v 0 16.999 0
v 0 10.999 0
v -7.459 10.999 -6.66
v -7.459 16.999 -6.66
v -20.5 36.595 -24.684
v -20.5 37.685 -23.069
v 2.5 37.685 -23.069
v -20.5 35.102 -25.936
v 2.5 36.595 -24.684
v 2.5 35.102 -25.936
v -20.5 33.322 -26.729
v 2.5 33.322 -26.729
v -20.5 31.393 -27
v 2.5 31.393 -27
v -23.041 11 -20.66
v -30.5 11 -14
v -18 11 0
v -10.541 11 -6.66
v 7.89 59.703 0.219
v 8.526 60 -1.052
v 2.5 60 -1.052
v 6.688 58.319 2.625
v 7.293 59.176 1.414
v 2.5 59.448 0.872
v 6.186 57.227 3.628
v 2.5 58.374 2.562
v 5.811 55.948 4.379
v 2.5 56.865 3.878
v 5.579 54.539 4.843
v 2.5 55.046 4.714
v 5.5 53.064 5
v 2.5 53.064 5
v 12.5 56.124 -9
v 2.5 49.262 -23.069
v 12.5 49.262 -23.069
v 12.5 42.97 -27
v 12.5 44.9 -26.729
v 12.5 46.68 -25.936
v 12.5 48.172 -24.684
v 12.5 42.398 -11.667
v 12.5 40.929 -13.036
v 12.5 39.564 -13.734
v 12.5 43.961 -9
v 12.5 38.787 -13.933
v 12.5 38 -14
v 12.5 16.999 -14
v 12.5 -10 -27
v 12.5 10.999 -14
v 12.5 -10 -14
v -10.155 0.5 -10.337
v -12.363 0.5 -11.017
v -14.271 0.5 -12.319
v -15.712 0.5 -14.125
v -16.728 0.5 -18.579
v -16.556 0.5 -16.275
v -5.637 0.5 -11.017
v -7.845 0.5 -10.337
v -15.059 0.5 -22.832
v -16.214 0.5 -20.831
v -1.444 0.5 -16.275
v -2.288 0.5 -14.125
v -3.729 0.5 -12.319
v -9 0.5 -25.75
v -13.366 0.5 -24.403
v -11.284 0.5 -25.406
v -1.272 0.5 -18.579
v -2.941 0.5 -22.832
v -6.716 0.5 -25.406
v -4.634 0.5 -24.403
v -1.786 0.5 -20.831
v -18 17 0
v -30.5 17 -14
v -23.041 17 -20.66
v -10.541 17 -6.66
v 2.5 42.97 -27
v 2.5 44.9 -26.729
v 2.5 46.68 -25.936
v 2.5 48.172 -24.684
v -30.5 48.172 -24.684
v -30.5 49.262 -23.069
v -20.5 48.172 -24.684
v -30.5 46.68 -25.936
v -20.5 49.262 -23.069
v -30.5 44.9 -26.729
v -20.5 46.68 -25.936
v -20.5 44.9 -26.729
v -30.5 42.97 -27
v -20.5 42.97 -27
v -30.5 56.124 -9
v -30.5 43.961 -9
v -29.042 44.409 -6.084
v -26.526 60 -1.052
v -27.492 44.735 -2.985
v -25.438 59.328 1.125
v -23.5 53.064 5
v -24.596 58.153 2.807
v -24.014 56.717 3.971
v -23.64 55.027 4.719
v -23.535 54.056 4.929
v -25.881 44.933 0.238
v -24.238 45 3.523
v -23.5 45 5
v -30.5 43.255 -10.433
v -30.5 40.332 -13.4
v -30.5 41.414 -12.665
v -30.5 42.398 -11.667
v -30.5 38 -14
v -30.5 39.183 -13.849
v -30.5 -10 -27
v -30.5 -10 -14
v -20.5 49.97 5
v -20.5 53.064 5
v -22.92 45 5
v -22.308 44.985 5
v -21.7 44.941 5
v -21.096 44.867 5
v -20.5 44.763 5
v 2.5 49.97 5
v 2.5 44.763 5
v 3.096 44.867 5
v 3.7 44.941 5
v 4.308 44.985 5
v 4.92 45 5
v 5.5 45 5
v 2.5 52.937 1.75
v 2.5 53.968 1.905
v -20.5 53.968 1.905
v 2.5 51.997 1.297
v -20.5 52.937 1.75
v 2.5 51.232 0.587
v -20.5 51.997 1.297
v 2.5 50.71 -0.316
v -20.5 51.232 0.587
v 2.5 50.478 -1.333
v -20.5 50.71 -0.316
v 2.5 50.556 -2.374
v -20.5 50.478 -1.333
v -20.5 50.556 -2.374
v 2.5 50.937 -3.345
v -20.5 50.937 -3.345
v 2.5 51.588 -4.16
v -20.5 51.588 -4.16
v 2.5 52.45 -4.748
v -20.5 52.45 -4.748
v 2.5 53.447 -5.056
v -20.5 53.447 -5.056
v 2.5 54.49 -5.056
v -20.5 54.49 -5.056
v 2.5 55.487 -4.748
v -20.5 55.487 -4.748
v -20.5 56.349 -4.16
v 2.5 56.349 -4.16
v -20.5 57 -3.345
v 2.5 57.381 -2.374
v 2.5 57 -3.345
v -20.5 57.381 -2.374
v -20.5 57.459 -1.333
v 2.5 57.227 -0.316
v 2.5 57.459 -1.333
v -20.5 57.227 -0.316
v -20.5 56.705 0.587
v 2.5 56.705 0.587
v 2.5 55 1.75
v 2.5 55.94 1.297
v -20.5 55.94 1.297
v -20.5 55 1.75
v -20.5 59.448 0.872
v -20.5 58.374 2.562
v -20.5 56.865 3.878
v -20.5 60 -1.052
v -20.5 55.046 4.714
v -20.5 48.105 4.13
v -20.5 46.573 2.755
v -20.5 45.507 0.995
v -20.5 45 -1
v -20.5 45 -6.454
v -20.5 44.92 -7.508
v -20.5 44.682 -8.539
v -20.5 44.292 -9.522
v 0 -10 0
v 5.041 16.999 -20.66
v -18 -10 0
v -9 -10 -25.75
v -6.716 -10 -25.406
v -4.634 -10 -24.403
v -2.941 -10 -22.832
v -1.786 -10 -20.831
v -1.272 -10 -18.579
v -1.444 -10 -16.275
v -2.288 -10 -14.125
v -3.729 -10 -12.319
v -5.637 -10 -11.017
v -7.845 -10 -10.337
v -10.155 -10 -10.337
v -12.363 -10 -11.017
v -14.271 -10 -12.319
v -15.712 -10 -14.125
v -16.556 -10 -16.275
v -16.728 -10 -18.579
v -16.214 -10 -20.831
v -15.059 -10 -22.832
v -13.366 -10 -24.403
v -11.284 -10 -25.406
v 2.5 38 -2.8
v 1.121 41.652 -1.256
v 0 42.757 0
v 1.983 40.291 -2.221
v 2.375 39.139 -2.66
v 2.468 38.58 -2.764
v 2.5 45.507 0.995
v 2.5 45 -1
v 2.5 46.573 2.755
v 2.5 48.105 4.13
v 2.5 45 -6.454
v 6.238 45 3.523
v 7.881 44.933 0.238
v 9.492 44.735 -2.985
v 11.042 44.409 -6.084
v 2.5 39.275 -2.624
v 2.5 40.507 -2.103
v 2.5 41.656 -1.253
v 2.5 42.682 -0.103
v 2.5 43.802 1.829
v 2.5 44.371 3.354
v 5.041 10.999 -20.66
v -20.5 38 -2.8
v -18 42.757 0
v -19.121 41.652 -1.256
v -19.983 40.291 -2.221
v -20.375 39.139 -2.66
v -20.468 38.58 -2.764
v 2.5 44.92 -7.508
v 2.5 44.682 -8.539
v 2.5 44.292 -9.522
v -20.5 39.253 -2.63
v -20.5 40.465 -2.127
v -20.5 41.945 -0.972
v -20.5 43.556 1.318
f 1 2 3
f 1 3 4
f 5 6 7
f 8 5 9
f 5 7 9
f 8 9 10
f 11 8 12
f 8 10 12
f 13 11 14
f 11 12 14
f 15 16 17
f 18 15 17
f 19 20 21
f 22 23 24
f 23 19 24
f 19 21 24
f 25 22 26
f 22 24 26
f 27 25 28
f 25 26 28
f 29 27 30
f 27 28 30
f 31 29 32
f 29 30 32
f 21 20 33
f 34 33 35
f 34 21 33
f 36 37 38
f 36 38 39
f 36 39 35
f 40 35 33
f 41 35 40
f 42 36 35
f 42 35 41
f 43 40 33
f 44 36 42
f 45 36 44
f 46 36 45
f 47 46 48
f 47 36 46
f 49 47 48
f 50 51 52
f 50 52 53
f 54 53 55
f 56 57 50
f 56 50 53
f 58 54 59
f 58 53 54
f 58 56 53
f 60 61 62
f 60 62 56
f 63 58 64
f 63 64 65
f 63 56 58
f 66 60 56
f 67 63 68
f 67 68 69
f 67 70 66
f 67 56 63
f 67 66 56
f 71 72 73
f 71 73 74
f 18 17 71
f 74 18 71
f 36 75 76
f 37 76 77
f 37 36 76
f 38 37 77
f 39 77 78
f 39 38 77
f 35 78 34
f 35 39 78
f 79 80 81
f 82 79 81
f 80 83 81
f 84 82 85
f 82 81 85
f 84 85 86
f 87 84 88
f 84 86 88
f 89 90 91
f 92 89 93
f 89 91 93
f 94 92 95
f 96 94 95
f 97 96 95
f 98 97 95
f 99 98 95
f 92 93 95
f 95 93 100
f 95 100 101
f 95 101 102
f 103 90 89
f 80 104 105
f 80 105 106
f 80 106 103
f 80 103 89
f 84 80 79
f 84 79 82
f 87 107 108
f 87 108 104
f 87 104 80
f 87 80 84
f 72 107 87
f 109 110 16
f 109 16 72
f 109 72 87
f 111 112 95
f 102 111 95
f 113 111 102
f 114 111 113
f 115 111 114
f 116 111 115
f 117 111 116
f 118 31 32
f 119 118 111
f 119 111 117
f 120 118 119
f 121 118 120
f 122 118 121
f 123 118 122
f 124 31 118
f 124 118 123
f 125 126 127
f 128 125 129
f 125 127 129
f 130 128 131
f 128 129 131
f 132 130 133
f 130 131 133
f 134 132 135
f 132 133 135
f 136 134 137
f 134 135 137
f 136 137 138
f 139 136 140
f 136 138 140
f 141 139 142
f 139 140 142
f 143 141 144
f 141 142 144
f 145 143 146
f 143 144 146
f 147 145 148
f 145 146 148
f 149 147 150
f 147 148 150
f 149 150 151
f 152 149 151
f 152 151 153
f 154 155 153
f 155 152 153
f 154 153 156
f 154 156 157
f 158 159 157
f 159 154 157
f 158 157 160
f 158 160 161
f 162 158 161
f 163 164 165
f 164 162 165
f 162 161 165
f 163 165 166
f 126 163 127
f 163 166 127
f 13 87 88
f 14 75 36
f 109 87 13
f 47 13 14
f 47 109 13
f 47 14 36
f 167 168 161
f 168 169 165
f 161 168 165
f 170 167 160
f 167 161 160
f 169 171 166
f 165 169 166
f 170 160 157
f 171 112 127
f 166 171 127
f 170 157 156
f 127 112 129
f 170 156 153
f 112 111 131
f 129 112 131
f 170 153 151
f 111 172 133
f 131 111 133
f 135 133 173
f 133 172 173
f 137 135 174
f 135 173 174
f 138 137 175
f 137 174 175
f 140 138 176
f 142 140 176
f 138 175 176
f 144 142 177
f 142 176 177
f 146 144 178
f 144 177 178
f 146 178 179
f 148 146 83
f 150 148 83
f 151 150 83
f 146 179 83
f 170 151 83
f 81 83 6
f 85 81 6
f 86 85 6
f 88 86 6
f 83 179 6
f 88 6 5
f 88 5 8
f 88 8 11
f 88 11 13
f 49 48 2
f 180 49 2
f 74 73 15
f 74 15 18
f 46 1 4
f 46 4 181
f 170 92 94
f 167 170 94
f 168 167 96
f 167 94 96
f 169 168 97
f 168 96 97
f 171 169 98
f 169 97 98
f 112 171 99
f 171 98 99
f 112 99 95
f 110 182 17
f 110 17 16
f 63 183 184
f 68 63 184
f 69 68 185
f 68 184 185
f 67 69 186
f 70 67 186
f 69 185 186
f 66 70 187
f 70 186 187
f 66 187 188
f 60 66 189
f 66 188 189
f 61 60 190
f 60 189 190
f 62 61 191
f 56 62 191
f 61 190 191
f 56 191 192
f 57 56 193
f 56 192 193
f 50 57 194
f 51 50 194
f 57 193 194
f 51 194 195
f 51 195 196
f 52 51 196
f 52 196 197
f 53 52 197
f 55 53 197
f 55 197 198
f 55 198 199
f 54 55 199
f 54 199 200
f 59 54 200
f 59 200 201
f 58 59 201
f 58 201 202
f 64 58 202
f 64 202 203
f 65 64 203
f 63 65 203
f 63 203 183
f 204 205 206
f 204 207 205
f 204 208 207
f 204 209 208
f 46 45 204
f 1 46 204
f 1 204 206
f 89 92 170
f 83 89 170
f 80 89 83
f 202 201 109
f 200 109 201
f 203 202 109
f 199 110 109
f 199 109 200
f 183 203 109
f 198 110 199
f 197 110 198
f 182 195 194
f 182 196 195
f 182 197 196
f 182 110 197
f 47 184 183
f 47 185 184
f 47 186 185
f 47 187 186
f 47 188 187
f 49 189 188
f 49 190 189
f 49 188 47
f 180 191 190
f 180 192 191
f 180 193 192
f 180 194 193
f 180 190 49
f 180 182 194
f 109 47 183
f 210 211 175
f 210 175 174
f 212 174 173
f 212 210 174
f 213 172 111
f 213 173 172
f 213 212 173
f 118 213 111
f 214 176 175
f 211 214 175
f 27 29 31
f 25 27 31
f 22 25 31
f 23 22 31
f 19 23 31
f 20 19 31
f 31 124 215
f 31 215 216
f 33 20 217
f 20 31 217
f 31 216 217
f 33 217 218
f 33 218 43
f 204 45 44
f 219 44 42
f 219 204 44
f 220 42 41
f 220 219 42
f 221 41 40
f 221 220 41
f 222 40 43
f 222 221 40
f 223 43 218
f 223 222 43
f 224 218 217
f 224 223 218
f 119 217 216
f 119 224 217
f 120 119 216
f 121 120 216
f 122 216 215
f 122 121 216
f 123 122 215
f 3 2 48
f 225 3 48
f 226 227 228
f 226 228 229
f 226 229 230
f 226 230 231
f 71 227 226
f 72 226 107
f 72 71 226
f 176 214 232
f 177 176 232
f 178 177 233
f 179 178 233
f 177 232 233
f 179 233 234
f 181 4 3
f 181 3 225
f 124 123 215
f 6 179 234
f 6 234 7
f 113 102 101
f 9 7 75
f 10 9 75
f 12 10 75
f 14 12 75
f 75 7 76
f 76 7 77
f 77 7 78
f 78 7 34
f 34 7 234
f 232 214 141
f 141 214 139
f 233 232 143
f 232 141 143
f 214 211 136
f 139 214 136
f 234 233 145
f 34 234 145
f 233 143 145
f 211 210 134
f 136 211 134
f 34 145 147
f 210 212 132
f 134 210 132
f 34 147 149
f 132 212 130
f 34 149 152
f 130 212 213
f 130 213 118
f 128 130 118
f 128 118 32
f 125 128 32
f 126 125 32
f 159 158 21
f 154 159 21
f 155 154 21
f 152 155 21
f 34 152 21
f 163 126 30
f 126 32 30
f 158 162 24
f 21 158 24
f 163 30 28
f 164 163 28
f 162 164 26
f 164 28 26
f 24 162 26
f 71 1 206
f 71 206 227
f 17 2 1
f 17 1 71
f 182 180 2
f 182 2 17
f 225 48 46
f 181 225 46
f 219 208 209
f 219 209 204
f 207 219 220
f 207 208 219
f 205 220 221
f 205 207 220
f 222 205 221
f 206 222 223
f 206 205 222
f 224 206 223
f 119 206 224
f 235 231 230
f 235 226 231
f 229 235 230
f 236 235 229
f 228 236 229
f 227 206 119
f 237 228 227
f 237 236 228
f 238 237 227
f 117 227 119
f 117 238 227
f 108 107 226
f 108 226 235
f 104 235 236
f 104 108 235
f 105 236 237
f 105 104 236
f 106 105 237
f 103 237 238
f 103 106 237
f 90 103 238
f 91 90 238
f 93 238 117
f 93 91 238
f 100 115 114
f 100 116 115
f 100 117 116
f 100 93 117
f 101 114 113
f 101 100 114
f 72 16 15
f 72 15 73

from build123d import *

# Parameters (mm, degrees)
BOSS_EXTRUDE1_DEPTH     = 30
SKETCH6_R               = 7.75
CUT_EXTRUDE3_DEPTH      = 0.5
BOSS_EXTRUDE2_DEPTH     = 15
BOSS_EXTRUDE3_DEPTH     = 15
CHAMFER1_SIZE           = 5
CHAMFER1_SIZE2          = 10.251519208
BOSS_EXTRUDE5_DEPTH     = 15
BOSS_EXTRUDE6_REACH     = 75.607
SKETCH10_R              = 3.5
BOSS_EXTRUDE7_REACH     = 62.698
SKETCH18_W              = 10
SKETCH18_H              = 10.251519208
CUT_EXTRUDE4_DEPTH      = 74.607064878
CUT_EXTRUDE4_DEPTH_BACK = 74.607064878
FILLET4_R               = 7
FILLET5_R               = 7
FILLET6_R               = 7
FILLET7_R               = 7
BOSS_EXTRUDE8_REACH     = 75.607
FILLET9_R               = 7
CUT_EXTRUDE5_DEPTH      = 23
FILLET12_R              = 7
BOSS_EXTRUDE9_REACH     = 75.607
BOSS_EXTRUDE10_START    = 10
SKETCH24_R              = 7.75
BOSS_EXTRUDE10_DEPTH    = 10
SKETCH25_W              = 18.768324379
SKETCH25_H              = 6
CUT_EXTRUDE6_DEPTH      = 10
SKETCH26_W              = 18.768324379
SKETCH26_H              = 6
CUT_EXTRUDE7_DEPTH      = 10


with BuildPart() as part:
    # Sketch1 → Boss-Extrude1 (new body)
    with BuildSketch(Plane(origin=(0, 0, 0), x_dir=(1, 0, 0), z_dir=(0, 1, 0))):
        Polygon((-30.5, 27), (12.5, 27), (12.5, 14), (0, 0), (-18, 0), (-30.5, 14), align=None)
    extrude(amount=BOSS_EXTRUDE1_DEPTH)

    # Sketch6 → Cut-Extrude3 (cut)
    with BuildSketch(Plane.XZ):
        with Locations(Location((-9, -18, 0), (0, 0, 270))):
            Circle(SKETCH6_R)
    extrude(amount=-CUT_EXTRUDE3_DEPTH, mode=Mode.SUBTRACT)

    # Sketch7 → Boss-Extrude2 (add)
    with BuildSketch(Plane(origin=(0, 30, 0), x_dir=(1, 0, 0), z_dir=(0, 1, 0))):
        Polygon((-30.5, 27), (-30.5, 14), (-18, 0), (0, 0), (12.5, 14), (12.5, 27), align=None)
    extrude(amount=BOSS_EXTRUDE2_DEPTH)

    # Sketch8 → Boss-Extrude3 (add)
    with BuildSketch(Plane(origin=(0, 45, 0), x_dir=(1, 0, 0), z_dir=(0, 1, 0))):
        Polygon((-30.5, 27), (-30.5, 9), (-23.5, -5), (-20.5, -5), (-20.5, 27), align=None)
    extrude(amount=BOSS_EXTRUDE3_DEPTH)

    # Chamfer1
    chamfer1_edges = [part.edges().sort_by_distance(p)[0] for p in [
        (-4, 45, -27),
    ]]
    chamfer1_side = [part.faces().sort_by_distance(p)[0] for p in [
        (-10.18705036, 24.658273381, -27),
    ]]
    chamfer(chamfer1_edges, length=CHAMFER1_SIZE, length2=CHAMFER1_SIZE2, reference=chamfer1_side[0])

    # Sketch12 → Boss-Extrude5 (add)
    with BuildSketch(Plane(origin=(0, 45, 0), x_dir=(1, 0, 0), z_dir=(0, 1, 0))):
        Polygon((12.5, 9), (12.5, 27), (2.5, 27), (2.5, -5), (5.5, -5), align=None)
    extrude(amount=BOSS_EXTRUDE5_DEPTH)

    # Sketch10 → Boss-Extrude6 (add, up to next)
    with BuildSketch(Plane(origin=(-20.5, 0, 0), x_dir=(0, 0, -1), z_dir=(1, 0, 0)), mode=Mode.PRIVATE) as boss_extrude6_sk1:
        with Locations(Location((1.594739548, 53.968499846, 0), (0, 0, 180))):
            Circle(SKETCH10_R)
    boss_extrude6_tool1 = extrude(boss_extrude6_sk1.sketch, amount=BOSS_EXTRUDE6_REACH, mode=Mode.PRIVATE) - part.part
    add(boss_extrude6_tool1.solids().sort_by_distance((-20.5, 53.9685, -1.59474))[0])

    # Boss-Extrude7: up to this face of the body (flat: up to its plane)
    boss_extrude7_end = Plane(part.part.faces().sort_by_distance((-4, 42.5, -21.874240396))[0])
    # Sketch18 → Boss-Extrude7 (add, up to the picked face)
    with BuildSketch(Plane.XZ.offset(-45), mode=Mode.PRIVATE) as boss_extrude7_sk1:
        with Locations((7.5, -21.874240396)):
            Rectangle(SKETCH18_W, SKETCH18_H)
    boss_extrude7_tool1 = split(extrude(boss_extrude7_sk1.sketch, amount=BOSS_EXTRUDE7_REACH, mode=Mode.PRIVATE), bisect_by=boss_extrude7_end, keep=Keep.BOTH, mode=Mode.PRIVATE)
    add(boss_extrude7_tool1.solids().sort_by(Axis((7.5, 45, -21.87424), (0, -1, 0)))[0])

    # Sketch19 → Cut-Extrude4 (cut, two sides: drawn at the far end of the back side and taken through both)
    with BuildSketch(Plane(origin=(-20.5, 0, 0), x_dir=(0, 0, -1), z_dir=(1, 0, 0)).offset(-CUT_EXTRUDE4_DEPTH_BACK)):
        Polygon((1.052419117, 60), (27, 47.344519209), (30.679345013, 60.875953777), (1.052419117, 61.751907555), align=None)
    extrude(amount=CUT_EXTRUDE4_DEPTH + CUT_EXTRUDE4_DEPTH_BACK, mode=Mode.SUBTRACT)

    # Fillet4
    # the kernel refuses this fillet: 7 mm, written as the material it takes off along each edge
    with BuildSketch(Plane(origin=(-40.838917655, 60, 5), x_dir=(0, 0, -1), z_dir=(1, 0, 0))) as fillet4_piece_1:
        with BuildLine():
            CenterArc((7, -6.935567062), FILLET4_R, 97.779940417, 82.220059583)
            Line((0, -6.935567062), (-0.14, -6.935567062))
            Line((-0.14, -6.935567062), (-0.14, 0))
            Line((-0.14, 0), (0, 0.14))
            ThreePointArc((0, 0.14), (3.026209558, 0.14), (6.033467499, 0.138711341))
            Line((6.033467499, 0.138711341), (6.052419117, 0))
        make_face()
    extrude(amount=37.677835309, mode=Mode.SUBTRACT)

    # Fillet5
    # the kernel refuses this fillet: 7 mm, written as the material it takes off along each edge
    with BuildSketch(Plane(origin=(-14.838917655, 60, 5), x_dir=(0, 0, -1), z_dir=(1, 0, 0))) as fillet5_piece_1:
        with BuildLine():
            CenterArc((7, -6.935567062), FILLET5_R, 97.779940417, 82.220059583)
            Line((0, -6.935567062), (-0.14, -6.935567062))
            Line((-0.14, -6.935567062), (-0.14, 0))
            Line((-0.14, 0), (0, 0.14))
            ThreePointArc((0, 0.14), (3.026209558, 0.14), (6.033467499, 0.138711341))
            Line((6.033467499, 0.138711341), (6.052419117, 0))
        make_face()
    extrude(amount=37.677835309, mode=Mode.SUBTRACT)

    # Fillet6
    # the kernel refuses this fillet: 7 mm, written as the material it adds along each edge
    with BuildSketch(Plane(origin=(-9.155275963, 45, 10.253909078), x_dir=(0, -1, 0), z_dir=(0.6660157693088524, 0, -0.7459376616259147))) as fillet6_piece_1_section:
        with BuildLine():
            CenterArc((FILLET6_R, -FILLET6_R), FILLET6_R, 90, 90)
            Line((0, -FILLET6_R), (0, 0))
            Line((0, 0), (FILLET6_R, 0))
        make_face()
    fillet6_piece_1 = extrude(amount=50.014659503, mode=Mode.PRIVATE)
    fillet6_piece_1 = split(fillet6_piece_1, bisect_by=Plane(origin=(12.5, 45, 10.253909078), z_dir=(-1, 0, 0)), keep=Keep.TOP, mode=Mode.PRIVATE)
    fillet6_piece_1 = split(fillet6_piece_1, bisect_by=Plane(origin=(2.5, 45, 10.253909078), z_dir=(1, 0, 0)), keep=Keep.TOP, mode=Mode.PRIVATE)
    fillet6_piece_1 = split(fillet6_piece_1, bisect_by=Plane(origin=(0.467381176, 45, 15.065237648), z_dir=(-0.8944271909999162, 0, -0.4472135954999575)), keep=Keep.TOP, mode=Mode.PRIVATE)
    fillet6_piece_1 = split(fillet6_piece_1, bisect_by=Plane(origin=(-9.155275963, 45, 5), z_dir=(0, 0, -1)), keep=Keep.TOP, mode=Mode.PRIVATE)
    add(fillet6_piece_1)

    # Fillet7
    # the kernel refuses this fillet: 7 mm, written as the material it adds along each edge
    with BuildSketch(Plane(origin=(-42.155275963, 45, -27.053909078), x_dir=(-0.7459376616259148, 0, 0.6660157693088522), z_dir=(0.6660157693088522, 0, 0.7459376616259148))) as fillet7_piece_1_section:
        with BuildLine():
            CenterArc((FILLET7_R, FILLET7_R), FILLET7_R, 180, 90)
            Line((0, FILLET7_R), (0, 0))
            Line((0, 0), (FILLET7_R, 0))
        make_face()
    fillet7_piece_1 = extrude(amount=50.014659503, mode=Mode.PRIVATE)
    fillet7_piece_1 = split(fillet7_piece_1, bisect_by=Plane(origin=(-30.5, 45, -27.053909078), z_dir=(1, 0, 0)), keep=Keep.TOP, mode=Mode.PRIVATE)
    fillet7_piece_1 = split(fillet7_piece_1, bisect_by=Plane(origin=(-42.155275963, 45, 5), z_dir=(0, 0, -1)), keep=Keep.TOP, mode=Mode.PRIVATE)
    fillet7_piece_1 = split(fillet7_piece_1, bisect_by=Plane(origin=(-40.052618824, 45, -28.105237648), z_dir=(0.8944271909999161, 0, -0.4472135954999577)), keep=Keep.TOP, mode=Mode.PRIVATE)
    fillet7_piece_1 = split(fillet7_piece_1, bisect_by=Plane(origin=(-20.5, 45, -27.053909078), z_dir=(-1, 0, 0)), keep=Keep.TOP, mode=Mode.PRIVATE)
    add(fillet7_piece_1)

    # Sketch21 → Boss-Extrude8 (add, up to next)
    with BuildSketch(Plane(origin=(-20.5, 0, 0), x_dir=(0, 0, -1), z_dir=(1, 0, 0)), mode=Mode.PRIVATE) as boss_extrude8_sk1:
        with BuildLine():
            Line((2.8, 45), (-5, 45))
            Line((-5, 45), (-5, 44.763260828))
            add(Edge.make_bspline(
                [(2.8, 38), (2.8, 43.376764541), (-5, 44.763260828)],
                knots=[0, 0, 0, 1.309981256, 1.309981256, 1.309981256], degree=2, weights=[1, 0.793053637, 1]))
            Line((2.8, 38), (2.8, 45))
        make_face()
    boss_extrude8_tool1 = extrude(boss_extrude8_sk1.sketch, amount=BOSS_EXTRUDE8_REACH, mode=Mode.PRIVATE) - part.part
    add(boss_extrude8_tool1.solids().sort_by_distance((-20.5, 43.416068, -0.535904))[0])

    # Fillet9
    fillet9_edges = [part.edges().sort_by_distance(p)[0] for p in [
        (-25.5, 47.344519209, -27),
        (7.5, 47.344519209, -27),
        (-9, 40, -27),
    ]]
    fillet(fillet9_edges, radius=FILLET9_R)

    # Sketch22 → Cut-Extrude5 (cut)
    with BuildSketch(Plane.ZY.offset(-2.5)):
        Polygon((5, 51.374505428), (-27, 35.767062594), (-27, 42.970433745), (-2.018410751, 49.666818357), align=None)
    extrude(amount=CUT_EXTRUDE5_DEPTH, mode=Mode.SUBTRACT)

    # Fillet12
    # the kernel refuses this fillet: 7 mm, written as the material it takes off along each edge
    with BuildSketch(Plane(origin=(2.5, 35.767763648, -26.998562626), x_dir=(0, -0.9999999460246048, -0.0003285586515390651), z_dir=(-1, 0, 0))) as fillet12_piece_1:
        with BuildLine():
            CenterArc((4.372486843, 6.999999622), FILLET12_R, 206.018825024, 64)
            Line((-1.918062927, 3.929334614), (-2.547117904, 3.622268114))
            Line((-2.547117904, 3.622268114), (-0.629054977, -0.307066501))
            Line((-0.629054977, -0.307066501), (-0.013954967, -0.699860885))
            ThreePointArc((-0.013954967, -0.699860885), (0.142079567, -0.70139073), (4.375016745, -0.699999962))
            Line((4.375016745, -0.699999962), (4.374786754, 0))
        make_face()
    extrude(amount=23, mode=Mode.SUBTRACT)
    with BuildSketch(Plane(origin=(2.5, 45, -8.069672968), x_dir=(0, -0.438371146789077, -0.8987940462991671), z_dir=(-1, 0, 0))) as fillet12_piece_2:
        with BuildLine():
            CenterArc((FILLET12_R * 0.230868191126, FILLET12_R), FILLET12_R, 244, 26)
            Line((-FILLET12_R * 0.207502955664, FILLET12_R * 0.101205953701), (0, 0))
            Line((0, 0), (FILLET12_R * 0.230868191126, 0))
        make_face()
    extrude(amount=23, mode=Mode.SUBTRACT)

    # Sketch23 → Boss-Extrude9 (add, up to next)
    with BuildSketch(Plane.ZY.offset(-2.5), mode=Mode.PRIVATE) as boss_extrude9_sk1:
        with BuildLine():
            Line((5, 45), (-1, 45))
            ThreePointArc((-1, 45), (2.755309717, 46.57305469), (5, 49.969849895))
            Line((5, 49.969849895), (5, 45))
        make_face()
    boss_extrude9_tool1 = extrude(boss_extrude9_sk1.sketch, amount=BOSS_EXTRUDE9_REACH, mode=Mode.PRIVATE) - part.part
    add(boss_extrude9_tool1.solids().sort_by_distance((2.5, 46.322933, 3.503714))[0])

    # Sketch24 → Boss-Extrude10 (add)
    with BuildSketch(Plane.XZ.offset(BOSS_EXTRUDE10_START)):
        Polygon((-30.5, -14), (-30.5, -27), (12.5, -27), (12.5, -14), (0, 0), (-18, 0), align=None)
        with Locations(Location((-9, -18, 0), (0, 0, 270))):
            Circle(SKETCH24_R, mode=Mode.SUBTRACT)
    extrude(amount=-BOSS_EXTRUDE10_DEPTH)

    # Sketch25 → Cut-Extrude6 (cut)
    with BuildSketch(Plane(origin=(0, 0, 0), x_dir=(0.6660157693088523, 0, -0.7459376616259148), z_dir=(0.7459376616259148, 0, 0.6660157693088523))):
        with Locations((9.38416219, 13.99928604)):
            Rectangle(SKETCH25_W, SKETCH25_H)
    extrude(amount=-CUT_EXTRUDE6_DEPTH, mode=Mode.SUBTRACT)

    # Sketch26 → Cut-Extrude7 (cut)
    with BuildSketch(Plane(origin=(-10.015613911, 0, 8.94251242), x_dir=(0.6660157693088522, 0, 0.7459376616259148), z_dir=(-0.7459376616259148, 0, 0.6660157693088522))):
        with Locations((-21.372446038, 14)):
            Rectangle(SKETCH26_W, SKETCH26_H)
    extrude(amount=-CUT_EXTRUDE7_DEPTH, mode=Mode.SUBTRACT)


solid = part.part
